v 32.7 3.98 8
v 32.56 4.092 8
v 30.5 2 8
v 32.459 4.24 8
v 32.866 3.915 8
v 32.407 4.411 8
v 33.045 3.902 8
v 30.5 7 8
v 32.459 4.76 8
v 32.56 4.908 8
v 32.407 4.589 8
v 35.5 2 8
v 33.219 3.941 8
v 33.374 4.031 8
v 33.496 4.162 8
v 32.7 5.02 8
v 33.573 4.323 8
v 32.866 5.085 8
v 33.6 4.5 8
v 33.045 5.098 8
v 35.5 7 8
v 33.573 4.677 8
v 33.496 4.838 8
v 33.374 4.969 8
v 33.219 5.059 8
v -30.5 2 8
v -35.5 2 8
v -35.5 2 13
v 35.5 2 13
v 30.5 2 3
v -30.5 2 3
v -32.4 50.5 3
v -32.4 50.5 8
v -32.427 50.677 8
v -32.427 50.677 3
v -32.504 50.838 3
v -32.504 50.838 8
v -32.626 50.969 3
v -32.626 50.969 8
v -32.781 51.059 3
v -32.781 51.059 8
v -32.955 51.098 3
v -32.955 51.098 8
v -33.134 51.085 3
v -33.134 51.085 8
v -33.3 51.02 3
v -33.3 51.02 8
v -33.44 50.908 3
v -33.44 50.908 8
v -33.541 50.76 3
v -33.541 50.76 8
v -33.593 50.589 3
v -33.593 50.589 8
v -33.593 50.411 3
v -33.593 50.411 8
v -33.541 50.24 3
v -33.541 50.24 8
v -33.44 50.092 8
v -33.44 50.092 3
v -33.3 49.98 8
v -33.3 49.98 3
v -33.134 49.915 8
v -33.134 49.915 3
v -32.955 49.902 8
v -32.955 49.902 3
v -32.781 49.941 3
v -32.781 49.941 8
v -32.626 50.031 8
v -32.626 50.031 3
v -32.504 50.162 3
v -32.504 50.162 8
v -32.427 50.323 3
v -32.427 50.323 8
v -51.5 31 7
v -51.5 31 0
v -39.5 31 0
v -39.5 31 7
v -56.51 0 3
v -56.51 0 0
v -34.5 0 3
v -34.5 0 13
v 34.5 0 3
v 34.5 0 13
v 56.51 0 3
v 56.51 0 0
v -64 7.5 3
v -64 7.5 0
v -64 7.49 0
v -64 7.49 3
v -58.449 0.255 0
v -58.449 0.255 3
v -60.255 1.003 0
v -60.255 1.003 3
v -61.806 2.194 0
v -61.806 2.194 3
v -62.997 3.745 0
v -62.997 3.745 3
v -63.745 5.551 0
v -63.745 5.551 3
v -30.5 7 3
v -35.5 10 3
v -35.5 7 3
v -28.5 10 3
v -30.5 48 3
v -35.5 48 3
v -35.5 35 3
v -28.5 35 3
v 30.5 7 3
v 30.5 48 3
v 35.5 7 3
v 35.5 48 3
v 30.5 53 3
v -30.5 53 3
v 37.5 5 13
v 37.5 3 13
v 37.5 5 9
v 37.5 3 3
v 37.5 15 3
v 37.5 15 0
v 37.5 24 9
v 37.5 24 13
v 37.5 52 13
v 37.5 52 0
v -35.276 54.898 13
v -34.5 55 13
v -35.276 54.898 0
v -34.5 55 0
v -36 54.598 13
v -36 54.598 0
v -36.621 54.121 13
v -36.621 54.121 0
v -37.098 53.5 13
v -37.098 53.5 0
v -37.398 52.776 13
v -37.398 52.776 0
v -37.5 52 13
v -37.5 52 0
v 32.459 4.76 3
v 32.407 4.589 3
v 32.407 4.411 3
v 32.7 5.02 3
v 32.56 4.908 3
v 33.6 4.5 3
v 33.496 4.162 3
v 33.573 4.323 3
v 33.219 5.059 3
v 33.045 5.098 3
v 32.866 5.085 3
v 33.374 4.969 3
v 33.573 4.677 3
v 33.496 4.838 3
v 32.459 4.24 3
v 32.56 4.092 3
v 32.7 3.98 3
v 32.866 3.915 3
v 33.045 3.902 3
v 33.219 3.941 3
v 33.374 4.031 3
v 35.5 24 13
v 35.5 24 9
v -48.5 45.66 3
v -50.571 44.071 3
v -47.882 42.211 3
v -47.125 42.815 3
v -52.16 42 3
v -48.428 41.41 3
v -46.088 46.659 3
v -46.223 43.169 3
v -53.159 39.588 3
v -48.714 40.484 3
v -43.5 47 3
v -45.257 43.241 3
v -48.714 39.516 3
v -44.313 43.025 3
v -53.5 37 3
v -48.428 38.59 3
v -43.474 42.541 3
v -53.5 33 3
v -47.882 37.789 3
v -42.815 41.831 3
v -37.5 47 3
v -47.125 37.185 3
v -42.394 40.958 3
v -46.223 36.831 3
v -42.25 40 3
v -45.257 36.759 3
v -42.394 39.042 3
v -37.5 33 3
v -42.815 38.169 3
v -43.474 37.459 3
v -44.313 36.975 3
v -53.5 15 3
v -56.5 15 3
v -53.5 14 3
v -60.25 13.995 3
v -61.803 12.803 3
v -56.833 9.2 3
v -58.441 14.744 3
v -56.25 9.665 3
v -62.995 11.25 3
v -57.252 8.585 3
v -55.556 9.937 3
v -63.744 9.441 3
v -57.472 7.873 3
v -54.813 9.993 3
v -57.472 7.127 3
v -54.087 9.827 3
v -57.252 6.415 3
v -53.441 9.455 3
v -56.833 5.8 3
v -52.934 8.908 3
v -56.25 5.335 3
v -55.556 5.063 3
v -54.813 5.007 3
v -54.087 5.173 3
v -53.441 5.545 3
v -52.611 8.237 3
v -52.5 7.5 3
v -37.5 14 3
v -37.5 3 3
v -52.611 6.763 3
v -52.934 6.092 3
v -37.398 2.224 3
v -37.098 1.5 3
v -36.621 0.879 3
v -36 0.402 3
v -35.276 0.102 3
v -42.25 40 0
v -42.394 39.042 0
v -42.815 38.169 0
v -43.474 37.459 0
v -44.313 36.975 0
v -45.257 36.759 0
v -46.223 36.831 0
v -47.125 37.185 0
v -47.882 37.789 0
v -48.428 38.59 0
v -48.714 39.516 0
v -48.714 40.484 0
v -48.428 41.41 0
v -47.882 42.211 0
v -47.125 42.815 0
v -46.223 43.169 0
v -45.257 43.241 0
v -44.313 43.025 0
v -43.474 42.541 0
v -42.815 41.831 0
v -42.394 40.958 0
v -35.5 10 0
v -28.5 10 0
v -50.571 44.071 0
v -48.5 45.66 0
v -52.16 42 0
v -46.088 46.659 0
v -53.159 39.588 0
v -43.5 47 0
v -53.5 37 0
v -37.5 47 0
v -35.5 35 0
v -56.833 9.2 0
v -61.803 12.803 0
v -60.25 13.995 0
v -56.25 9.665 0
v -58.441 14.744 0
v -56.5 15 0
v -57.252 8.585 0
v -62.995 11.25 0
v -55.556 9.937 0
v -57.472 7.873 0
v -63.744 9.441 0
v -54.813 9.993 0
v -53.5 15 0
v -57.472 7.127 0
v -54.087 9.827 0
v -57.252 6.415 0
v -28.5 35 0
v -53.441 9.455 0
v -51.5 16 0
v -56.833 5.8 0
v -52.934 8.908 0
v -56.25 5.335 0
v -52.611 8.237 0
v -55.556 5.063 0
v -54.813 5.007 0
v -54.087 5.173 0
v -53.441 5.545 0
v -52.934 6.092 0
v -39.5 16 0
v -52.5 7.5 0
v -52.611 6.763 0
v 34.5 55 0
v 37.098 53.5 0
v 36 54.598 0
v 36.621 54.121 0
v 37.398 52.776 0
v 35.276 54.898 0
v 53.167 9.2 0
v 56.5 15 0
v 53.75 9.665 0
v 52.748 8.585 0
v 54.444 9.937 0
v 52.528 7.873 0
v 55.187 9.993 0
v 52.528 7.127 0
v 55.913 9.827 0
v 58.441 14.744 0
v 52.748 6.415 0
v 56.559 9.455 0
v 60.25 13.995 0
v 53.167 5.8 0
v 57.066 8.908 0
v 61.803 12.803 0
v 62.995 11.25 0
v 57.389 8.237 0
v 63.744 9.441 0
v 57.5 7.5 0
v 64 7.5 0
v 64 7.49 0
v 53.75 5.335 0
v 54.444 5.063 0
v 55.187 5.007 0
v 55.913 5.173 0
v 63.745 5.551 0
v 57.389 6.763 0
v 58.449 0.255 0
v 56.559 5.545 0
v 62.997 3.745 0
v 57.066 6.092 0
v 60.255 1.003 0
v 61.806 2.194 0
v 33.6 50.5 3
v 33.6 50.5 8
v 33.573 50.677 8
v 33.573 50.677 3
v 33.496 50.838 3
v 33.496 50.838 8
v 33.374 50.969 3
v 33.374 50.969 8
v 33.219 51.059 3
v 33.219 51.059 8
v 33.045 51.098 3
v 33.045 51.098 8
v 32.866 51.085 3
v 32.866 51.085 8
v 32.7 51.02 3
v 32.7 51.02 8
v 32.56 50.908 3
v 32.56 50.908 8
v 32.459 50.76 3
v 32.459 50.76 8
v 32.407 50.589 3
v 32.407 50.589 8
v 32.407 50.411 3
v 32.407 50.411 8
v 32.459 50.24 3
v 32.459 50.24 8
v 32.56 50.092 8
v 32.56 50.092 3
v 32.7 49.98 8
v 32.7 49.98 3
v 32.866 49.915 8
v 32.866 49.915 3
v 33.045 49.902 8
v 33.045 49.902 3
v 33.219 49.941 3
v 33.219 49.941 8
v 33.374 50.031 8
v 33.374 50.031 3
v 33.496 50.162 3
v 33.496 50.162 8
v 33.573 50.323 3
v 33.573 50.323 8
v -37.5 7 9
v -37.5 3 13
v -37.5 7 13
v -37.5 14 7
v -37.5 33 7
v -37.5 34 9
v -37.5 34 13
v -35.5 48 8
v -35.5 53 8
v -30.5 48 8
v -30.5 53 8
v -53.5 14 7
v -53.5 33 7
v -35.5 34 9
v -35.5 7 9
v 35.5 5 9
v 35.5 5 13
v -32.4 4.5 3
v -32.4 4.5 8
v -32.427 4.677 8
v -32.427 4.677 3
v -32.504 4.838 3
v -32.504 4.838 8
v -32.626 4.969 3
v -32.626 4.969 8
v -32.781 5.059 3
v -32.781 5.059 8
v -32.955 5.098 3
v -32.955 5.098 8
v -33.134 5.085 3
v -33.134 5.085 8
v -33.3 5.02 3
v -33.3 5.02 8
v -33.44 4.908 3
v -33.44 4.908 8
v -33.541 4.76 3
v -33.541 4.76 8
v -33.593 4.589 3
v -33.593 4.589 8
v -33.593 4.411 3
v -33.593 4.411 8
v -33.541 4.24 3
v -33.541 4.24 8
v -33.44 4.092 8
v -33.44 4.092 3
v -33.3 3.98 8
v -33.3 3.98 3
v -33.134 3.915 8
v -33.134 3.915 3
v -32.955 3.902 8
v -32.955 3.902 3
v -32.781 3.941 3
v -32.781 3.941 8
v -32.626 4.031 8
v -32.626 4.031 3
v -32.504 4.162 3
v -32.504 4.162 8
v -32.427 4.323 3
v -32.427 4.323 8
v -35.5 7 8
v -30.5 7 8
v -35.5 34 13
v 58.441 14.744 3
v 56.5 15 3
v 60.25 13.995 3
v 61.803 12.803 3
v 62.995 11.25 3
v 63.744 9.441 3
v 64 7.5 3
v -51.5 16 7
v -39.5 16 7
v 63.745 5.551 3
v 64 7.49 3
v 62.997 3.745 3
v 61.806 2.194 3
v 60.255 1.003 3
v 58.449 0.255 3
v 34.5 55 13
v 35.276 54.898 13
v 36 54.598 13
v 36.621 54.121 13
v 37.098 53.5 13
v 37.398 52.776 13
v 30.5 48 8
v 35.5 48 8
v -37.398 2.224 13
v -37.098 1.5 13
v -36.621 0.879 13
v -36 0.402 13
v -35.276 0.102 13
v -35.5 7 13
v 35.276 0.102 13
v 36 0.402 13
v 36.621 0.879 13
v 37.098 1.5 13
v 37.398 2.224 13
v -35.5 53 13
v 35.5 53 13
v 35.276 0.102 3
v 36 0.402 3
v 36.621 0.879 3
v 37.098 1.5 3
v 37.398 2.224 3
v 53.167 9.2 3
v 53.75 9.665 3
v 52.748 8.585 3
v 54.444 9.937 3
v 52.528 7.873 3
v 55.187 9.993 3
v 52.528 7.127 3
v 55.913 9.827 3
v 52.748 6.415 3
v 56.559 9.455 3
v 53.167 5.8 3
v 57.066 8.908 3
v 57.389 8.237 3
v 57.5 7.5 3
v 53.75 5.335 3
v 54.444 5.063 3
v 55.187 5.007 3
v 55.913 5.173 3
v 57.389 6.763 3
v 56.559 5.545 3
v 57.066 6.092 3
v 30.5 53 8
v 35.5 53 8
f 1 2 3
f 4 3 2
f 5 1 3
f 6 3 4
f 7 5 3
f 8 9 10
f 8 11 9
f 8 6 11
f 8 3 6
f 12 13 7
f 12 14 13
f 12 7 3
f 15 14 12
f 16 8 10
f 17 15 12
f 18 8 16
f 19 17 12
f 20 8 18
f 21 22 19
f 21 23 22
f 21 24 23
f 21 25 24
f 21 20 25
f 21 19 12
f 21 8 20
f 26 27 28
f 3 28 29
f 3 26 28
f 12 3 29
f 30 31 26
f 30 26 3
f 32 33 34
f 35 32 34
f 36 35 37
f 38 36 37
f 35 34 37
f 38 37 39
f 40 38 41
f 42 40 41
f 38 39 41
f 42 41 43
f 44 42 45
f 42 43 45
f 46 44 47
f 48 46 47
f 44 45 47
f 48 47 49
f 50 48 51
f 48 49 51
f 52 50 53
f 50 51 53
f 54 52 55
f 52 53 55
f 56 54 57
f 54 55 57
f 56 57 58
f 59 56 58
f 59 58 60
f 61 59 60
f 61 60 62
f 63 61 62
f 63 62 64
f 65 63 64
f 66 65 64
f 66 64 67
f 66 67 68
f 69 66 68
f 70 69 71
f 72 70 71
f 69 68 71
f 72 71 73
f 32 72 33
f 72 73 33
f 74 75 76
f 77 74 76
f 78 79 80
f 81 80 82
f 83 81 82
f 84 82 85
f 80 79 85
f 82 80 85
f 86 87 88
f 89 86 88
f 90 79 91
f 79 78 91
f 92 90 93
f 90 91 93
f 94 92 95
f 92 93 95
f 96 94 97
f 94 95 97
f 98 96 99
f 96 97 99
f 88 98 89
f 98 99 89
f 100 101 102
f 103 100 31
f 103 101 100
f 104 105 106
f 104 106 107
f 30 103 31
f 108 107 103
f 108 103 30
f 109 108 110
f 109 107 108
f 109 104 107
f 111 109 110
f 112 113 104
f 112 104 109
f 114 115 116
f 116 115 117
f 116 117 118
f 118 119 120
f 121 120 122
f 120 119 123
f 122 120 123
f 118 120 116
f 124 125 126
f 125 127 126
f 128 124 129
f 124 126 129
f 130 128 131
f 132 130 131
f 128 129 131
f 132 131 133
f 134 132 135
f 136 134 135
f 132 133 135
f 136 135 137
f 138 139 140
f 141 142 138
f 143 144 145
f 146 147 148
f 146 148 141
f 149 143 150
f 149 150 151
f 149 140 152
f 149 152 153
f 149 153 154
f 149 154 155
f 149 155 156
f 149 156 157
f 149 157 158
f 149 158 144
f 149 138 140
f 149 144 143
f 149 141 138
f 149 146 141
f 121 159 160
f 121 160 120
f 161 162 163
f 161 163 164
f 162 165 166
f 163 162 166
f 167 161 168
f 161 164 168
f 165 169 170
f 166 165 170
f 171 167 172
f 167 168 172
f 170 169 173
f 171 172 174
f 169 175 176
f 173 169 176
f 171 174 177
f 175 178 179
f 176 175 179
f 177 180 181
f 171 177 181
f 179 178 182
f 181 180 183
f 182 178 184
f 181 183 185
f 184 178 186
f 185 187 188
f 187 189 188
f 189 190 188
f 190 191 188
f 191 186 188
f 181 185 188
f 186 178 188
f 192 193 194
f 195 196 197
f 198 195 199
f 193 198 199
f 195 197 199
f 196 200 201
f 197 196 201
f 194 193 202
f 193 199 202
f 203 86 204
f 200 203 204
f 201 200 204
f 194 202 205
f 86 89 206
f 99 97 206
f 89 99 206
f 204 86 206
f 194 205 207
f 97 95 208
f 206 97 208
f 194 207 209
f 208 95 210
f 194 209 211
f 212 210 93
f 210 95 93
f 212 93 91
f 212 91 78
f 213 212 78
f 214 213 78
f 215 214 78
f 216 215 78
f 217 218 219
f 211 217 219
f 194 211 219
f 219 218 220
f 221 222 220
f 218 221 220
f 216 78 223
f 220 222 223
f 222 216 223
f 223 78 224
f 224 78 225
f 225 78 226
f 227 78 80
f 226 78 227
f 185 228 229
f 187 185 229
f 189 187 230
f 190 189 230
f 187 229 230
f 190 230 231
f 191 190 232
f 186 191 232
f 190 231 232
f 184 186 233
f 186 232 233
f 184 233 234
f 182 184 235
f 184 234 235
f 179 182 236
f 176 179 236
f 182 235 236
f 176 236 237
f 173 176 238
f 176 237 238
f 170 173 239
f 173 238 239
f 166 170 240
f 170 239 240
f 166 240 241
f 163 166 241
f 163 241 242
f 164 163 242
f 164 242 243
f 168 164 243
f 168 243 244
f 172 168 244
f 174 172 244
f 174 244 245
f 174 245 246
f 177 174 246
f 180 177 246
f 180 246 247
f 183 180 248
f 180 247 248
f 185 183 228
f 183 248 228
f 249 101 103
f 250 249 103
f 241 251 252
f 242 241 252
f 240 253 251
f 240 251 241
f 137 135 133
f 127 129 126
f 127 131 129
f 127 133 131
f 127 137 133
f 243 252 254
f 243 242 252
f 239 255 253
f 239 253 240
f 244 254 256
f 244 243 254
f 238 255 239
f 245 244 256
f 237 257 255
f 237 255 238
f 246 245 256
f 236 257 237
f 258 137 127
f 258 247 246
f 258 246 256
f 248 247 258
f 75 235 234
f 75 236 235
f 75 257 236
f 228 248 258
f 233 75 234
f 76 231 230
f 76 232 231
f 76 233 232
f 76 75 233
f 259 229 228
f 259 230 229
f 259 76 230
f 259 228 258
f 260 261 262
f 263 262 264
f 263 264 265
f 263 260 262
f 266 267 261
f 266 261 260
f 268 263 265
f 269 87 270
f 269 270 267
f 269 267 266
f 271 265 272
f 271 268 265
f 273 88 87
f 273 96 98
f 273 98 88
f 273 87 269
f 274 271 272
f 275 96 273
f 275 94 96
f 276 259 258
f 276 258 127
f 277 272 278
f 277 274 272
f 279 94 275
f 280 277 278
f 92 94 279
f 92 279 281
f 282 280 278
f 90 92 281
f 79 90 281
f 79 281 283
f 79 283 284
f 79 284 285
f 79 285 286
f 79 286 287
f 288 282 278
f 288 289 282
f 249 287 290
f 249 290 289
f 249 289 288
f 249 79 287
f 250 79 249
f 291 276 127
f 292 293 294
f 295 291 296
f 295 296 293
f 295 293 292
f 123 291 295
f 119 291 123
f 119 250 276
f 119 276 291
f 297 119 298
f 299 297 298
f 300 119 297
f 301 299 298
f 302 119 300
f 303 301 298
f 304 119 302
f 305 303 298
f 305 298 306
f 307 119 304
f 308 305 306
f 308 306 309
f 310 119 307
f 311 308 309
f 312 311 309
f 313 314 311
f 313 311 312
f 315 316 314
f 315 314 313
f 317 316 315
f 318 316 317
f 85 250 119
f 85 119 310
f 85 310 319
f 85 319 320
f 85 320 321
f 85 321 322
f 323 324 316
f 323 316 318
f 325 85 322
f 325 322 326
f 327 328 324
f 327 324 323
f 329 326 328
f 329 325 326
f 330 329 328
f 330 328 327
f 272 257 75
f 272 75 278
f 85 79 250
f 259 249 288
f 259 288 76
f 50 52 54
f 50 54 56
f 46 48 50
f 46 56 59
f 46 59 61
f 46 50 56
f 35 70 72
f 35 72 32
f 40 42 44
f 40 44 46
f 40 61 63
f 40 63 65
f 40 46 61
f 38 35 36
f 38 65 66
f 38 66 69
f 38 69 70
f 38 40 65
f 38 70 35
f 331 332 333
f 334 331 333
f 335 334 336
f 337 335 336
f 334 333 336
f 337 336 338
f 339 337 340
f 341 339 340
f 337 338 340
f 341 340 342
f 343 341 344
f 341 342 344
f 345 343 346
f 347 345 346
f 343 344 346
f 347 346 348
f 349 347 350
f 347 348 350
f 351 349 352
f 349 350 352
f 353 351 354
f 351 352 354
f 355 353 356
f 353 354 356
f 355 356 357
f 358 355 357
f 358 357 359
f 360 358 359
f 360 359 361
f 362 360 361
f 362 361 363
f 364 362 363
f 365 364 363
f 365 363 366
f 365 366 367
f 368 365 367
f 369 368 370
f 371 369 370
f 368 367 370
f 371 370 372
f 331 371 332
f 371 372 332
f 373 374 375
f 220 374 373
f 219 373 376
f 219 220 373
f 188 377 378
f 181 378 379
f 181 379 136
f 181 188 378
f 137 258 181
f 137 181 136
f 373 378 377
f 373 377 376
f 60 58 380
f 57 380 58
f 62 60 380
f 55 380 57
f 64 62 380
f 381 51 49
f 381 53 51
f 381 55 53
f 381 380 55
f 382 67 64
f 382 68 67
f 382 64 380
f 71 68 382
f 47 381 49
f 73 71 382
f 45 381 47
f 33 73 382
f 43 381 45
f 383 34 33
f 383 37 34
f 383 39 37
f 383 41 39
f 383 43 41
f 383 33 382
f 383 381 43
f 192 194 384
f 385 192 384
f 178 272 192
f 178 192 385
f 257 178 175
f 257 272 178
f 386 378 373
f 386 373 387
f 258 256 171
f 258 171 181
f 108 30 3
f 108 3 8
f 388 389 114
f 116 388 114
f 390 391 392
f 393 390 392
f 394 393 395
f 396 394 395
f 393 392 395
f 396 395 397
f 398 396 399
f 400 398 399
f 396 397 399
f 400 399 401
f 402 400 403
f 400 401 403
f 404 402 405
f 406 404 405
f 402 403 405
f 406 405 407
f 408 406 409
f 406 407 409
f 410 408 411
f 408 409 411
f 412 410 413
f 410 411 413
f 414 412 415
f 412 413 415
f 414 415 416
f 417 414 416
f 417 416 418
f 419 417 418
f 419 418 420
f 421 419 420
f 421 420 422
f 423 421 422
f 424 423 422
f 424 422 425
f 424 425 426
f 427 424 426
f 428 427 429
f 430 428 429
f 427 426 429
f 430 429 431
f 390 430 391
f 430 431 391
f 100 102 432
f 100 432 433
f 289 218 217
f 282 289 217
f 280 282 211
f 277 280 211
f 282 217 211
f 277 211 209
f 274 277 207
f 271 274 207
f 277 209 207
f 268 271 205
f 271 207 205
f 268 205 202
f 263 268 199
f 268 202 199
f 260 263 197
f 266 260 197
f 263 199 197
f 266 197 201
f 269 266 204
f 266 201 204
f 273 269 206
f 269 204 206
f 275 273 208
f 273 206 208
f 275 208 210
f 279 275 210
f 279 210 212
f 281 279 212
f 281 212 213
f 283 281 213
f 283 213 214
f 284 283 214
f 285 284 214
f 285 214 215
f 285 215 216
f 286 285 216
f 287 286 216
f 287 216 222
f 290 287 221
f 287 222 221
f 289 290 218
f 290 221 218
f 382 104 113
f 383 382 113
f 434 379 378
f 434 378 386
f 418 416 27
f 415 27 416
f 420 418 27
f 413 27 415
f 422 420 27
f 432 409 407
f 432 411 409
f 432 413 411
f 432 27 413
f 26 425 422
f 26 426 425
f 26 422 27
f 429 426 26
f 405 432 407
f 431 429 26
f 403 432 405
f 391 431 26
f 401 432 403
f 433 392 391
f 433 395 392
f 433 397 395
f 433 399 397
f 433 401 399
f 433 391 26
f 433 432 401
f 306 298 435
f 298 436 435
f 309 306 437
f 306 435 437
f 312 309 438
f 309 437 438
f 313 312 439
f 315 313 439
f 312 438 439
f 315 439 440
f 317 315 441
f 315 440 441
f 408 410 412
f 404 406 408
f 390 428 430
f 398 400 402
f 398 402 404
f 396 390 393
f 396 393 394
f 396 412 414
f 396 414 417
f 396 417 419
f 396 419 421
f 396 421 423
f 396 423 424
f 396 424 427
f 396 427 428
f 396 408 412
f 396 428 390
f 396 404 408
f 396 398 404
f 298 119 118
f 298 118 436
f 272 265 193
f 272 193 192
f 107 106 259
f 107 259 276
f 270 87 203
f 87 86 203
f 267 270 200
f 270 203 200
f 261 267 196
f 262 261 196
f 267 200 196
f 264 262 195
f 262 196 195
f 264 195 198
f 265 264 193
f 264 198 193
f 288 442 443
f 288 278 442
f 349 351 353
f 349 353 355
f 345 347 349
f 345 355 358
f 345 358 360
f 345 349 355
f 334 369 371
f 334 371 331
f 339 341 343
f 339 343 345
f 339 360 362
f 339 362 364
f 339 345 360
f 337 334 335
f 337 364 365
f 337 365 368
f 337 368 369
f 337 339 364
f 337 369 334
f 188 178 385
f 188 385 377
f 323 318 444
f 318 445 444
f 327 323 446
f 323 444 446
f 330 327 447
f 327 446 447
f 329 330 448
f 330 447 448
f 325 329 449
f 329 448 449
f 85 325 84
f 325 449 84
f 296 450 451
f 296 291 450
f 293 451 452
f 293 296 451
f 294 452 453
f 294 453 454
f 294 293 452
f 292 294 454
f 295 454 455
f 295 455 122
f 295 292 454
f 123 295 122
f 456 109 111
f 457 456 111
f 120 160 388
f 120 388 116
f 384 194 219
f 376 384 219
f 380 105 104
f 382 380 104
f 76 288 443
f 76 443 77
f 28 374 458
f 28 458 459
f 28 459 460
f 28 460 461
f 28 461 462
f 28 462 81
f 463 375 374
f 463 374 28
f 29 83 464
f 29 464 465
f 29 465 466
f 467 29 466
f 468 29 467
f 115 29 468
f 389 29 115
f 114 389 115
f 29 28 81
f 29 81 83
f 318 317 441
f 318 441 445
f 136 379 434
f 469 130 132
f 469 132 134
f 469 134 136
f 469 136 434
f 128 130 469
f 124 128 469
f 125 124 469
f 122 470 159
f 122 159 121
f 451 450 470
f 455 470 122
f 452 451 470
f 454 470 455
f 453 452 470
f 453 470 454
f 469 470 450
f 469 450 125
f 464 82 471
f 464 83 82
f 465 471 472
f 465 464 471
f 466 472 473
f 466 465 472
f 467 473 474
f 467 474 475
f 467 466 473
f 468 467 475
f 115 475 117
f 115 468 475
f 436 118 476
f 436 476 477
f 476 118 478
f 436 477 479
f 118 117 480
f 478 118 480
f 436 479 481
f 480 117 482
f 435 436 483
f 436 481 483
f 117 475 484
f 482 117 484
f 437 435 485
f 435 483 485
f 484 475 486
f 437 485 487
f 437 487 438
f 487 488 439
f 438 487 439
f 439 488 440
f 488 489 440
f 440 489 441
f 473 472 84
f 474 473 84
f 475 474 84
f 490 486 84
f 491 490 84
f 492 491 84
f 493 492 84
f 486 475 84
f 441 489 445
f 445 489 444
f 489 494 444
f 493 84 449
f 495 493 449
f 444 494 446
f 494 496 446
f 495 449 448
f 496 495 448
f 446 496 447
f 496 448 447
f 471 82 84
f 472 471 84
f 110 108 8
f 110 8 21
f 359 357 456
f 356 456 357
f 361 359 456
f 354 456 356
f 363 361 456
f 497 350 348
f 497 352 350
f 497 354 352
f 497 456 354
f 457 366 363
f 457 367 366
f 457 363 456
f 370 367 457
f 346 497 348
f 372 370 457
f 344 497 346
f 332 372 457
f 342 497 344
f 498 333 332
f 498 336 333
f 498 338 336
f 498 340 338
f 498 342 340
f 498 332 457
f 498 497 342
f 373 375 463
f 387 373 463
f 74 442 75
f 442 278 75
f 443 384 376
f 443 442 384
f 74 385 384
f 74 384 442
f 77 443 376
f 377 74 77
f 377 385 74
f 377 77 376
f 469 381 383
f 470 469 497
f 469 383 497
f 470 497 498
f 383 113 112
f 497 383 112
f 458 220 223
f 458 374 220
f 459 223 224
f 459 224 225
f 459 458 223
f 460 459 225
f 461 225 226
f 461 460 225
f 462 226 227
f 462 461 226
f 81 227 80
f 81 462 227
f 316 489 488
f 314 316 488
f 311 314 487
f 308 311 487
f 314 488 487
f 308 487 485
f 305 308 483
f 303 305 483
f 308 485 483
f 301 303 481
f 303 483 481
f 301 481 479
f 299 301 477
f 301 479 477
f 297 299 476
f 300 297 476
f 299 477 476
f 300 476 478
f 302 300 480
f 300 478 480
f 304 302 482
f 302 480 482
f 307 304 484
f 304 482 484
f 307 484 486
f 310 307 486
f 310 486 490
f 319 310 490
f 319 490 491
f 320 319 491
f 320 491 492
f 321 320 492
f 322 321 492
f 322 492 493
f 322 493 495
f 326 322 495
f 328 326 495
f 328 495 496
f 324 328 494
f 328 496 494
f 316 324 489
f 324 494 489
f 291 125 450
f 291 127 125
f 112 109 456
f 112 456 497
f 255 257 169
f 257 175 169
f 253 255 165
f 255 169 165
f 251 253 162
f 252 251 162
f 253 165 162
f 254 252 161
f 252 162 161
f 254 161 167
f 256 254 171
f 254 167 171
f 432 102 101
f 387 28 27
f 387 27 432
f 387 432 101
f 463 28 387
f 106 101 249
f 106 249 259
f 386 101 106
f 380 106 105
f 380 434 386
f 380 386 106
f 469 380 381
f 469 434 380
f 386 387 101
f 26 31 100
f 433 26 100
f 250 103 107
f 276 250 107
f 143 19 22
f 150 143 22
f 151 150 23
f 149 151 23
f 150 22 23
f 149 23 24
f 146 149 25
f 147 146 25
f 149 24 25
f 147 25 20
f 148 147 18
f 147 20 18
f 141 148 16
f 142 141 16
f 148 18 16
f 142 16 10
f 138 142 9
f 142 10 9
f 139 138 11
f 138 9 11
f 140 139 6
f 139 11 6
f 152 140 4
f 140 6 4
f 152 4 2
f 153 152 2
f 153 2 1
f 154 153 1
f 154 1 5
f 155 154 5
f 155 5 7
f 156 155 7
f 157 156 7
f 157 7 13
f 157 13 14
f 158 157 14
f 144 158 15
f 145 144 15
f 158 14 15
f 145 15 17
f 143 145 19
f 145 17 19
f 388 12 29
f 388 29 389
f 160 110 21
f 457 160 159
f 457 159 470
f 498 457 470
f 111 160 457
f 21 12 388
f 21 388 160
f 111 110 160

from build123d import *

# Parameters (mm, degrees)
SKETCH_W        = 75
SKETCH_H        = 55
PAD_DEPTH       = 3
SKETCH001_W     = 75
SKETCH001_H     = 55
SKETCH001_W_2   = 71
SKETCH001_H_2   = 51
PAD001_DEPTH    = 10
SKETCH002_W     = 5
SKETCH002_H     = 5
PAD002_DEPTH    = 5
SKETCH003_W     = 2
SKETCH003_H     = 19
POCKET_DEPTH    = 4
SKETCH004_W     = 2
SKETCH004_H     = 27
POCKET001_DEPTH = 4
SKETCH005_W     = 128
SKETCH005_H     = 15
PAD003_DEPTH    = 3
SKETCH006_R     = 2.5
POCKET002_DEPTH = 3
SKETCH007_W     = 16
SKETCH007_H     = 32
SKETCH007_R     = 3.25
SKETCH007_W_2   = 12
SKETCH007_H_2   = 15
PAD004_DEPTH    = 3
SKETCH010_W     = 7
SKETCH010_H     = 25
POCKET003_DEPTH = 3
SKETCH009_W     = 16
SKETCH009_H     = 19
SKETCH009_W_2   = 12
SKETCH009_H_2   = 15
PAD005_DEPTH    = 4
FILLET_R        = 10
FILLET001_R     = 3
FILLET002_R     = 3
FILLET003_R     = 3
FILLET004_R     = 3
FILLET005_R     = 7.5
FILLET006_R     = 7.49
FILLET007_R     = 7.49
FILLET008_R     = 7.5
SKETCH011_R     = 0.6
POCKET004_DEPTH = 5


with BuildPart() as part:
    # Sketch → Pad (new body)
    with BuildSketch(Plane.XY):
        with Locations((0, 27.5)):
            Rectangle(SKETCH_W, SKETCH_H)
    extrude(amount=PAD_DEPTH)

    # Sketch001 (on Face6 of Pad) → Pad001 (join)
    with BuildSketch(Plane.XY.offset(3)):
        with Locations((0, 27.5)):
            Rectangle(SKETCH001_W, SKETCH001_H)
        with Locations((0, 27.5)):
            Rectangle(SKETCH001_W_2, SKETCH001_H_2, mode=Mode.SUBTRACT)
    extrude(amount=PAD001_DEPTH)

    # Sketch002 (on Face15 of Pad001) → Pad002 (join)
    with BuildSketch(Plane.XY.offset(3)):
        with Locations((-33, 50.5)):
            Rectangle(SKETCH002_W, SKETCH002_H)
        with Locations((33, 50.5)):
            Rectangle(SKETCH002_W, SKETCH002_H)
        with Locations((33, 4.5)):
            Rectangle(SKETCH002_W, SKETCH002_H)
        with Locations((-33, 4.5)):
            Rectangle(SKETCH002_W, SKETCH002_H)
    extrude(amount=PAD002_DEPTH)

    # Sketch003 (on Face9 of Pad002) → Pocket (cut)
    with BuildSketch(Plane.XY.offset(13)):
        with Locations((36.5, 14.5)):
            Rectangle(SKETCH003_W, SKETCH003_H)
    extrude(amount=-POCKET_DEPTH, mode=Mode.SUBTRACT)

    # Sketch004 (on Face9 of Pocket) → Pocket001 (cut)
    with BuildSketch(Plane.XY.offset(13)):
        with Locations((-36.5, 20.5)):
            Rectangle(SKETCH004_W, SKETCH004_H)
    extrude(amount=-POCKET001_DEPTH, mode=Mode.SUBTRACT)

    # Sketch005 (on Face4 of Pocket001) → Pad003 (join)
    with BuildSketch(Plane(origin=(0, 0, 0), x_dir=(1, 0, 0), z_dir=(0, 0, -1))):
        with Locations((0, -7.5)):
            Rectangle(SKETCH005_W, SKETCH005_H)
    extrude(amount=-PAD003_DEPTH)

    # Sketch006 (on Face12 of Pad003) → Pocket002 (cut)
    with BuildSketch(Plane.XY.offset(3)):
        with Locations((-55, 7.5)):
            Circle(SKETCH006_R)
        with Locations((55, 7.5)):
            Circle(SKETCH006_R)
    extrude(amount=-POCKET002_DEPTH, mode=Mode.SUBTRACT)

    # Sketch007 (on Face4 of Pocket002) → Pad004 (join)
    with BuildSketch(Plane(origin=(0, 0, 0), x_dir=(1, 0, 0), z_dir=(0, 0, -1))):
        with Locations((-45.5, -31)):
            Rectangle(SKETCH007_W, SKETCH007_H)
        with Locations((-45.5, -40)):
            Circle(SKETCH007_R, mode=Mode.SUBTRACT)
        with Locations((-45.5, -23.5)):
            Rectangle(SKETCH007_W_2, SKETCH007_H_2, mode=Mode.SUBTRACT)
    extrude(amount=-PAD004_DEPTH)

    # Sketch010 (on Face46 of Pad004) → Pocket003 (cut)
    with BuildSketch(Plane.XY.offset(3)):
        with Locations((-32, 22.5)):
            Rectangle(SKETCH010_W, SKETCH010_H)
    extrude(amount=-POCKET003_DEPTH, mode=Mode.SUBTRACT)

    # Sketch009 (on Face22 of Pad004) → Pad005 (join)
    with BuildSketch(Plane.XY.offset(3)):
        with Locations((-45.5, 23.5)):
            Rectangle(SKETCH009_W, SKETCH009_H)
        with Locations((-45.5, 23.5)):
            Rectangle(SKETCH009_W_2, SKETCH009_H_2, mode=Mode.SUBTRACT)
    extrude(amount=PAD005_DEPTH)

    # Fillet
    fillet_edges = [part.edges().sort_by_distance(p)[0] for p in [
        (-53.5, 47, 1.5),
    ]]
    fillet(fillet_edges, radius=FILLET_R)

    # Fillet001
    fillet001_edges = [part.edges().sort_by_distance(p)[0] for p in [
        (37.5, 55, 8),
    ]]
    fillet(fillet001_edges, radius=FILLET001_R)

    # Fillet002
    fillet002_edges = [part.edges().sort_by_distance(p)[0] for p in [
        (-37.5, 55, 8),
    ]]
    fillet(fillet002_edges, radius=FILLET002_R)

    # Fillet003
    fillet003_edges = [part.edges().sort_by_distance(p)[0] for p in [
        (-37.5, 0, 8),
    ]]
    fillet(fillet003_edges, radius=FILLET003_R)

    # Fillet004
    fillet004_edges = [part.edges().sort_by_distance(p)[0] for p in [
        (37.5, 0, 8),
    ]]
    fillet(fillet004_edges, radius=FILLET004_R)

    # Fillet005
    fillet005_edges = [part.edges().sort_by_distance(p)[0] for p in [
        (64, 15, 1.5),
    ]]
    fillet(fillet005_edges, radius=FILLET005_R)

    # Fillet006
    fillet006_edges = [part.edges().sort_by_distance(p)[0] for p in [
        (64, 0, 1.5),
    ]]
    fillet(fillet006_edges, radius=FILLET006_R)

    # Fillet007
    fillet007_edges = [part.edges().sort_by_distance(p)[0] for p in [
        (-64, 0, 1.5),
    ]]
    fillet(fillet007_edges, radius=FILLET007_R)

    # Fillet008
    fillet008_edges = [part.edges().sort_by_distance(p)[0] for p in [
        (-64, 15, 1.5),
    ]]
    fillet(fillet008_edges, radius=FILLET008_R)

    # Sketch011 (on Face73 of Fillet008) → Pocket004 (cut)
    with BuildSketch(Plane.XY.offset(8)):
        with Locations((-33, 4.5)):
            Circle(SKETCH011_R)
        with Locations((33, 4.5)):
            Circle(SKETCH011_R)
        with Locations((-33, 50.5)):
            Circle(SKETCH011_R)
        with Locations((33, 50.5)):
            Circle(SKETCH011_R)
    extrude(amount=-POCKET004_DEPTH, mode=Mode.SUBTRACT)


solid = part.part
